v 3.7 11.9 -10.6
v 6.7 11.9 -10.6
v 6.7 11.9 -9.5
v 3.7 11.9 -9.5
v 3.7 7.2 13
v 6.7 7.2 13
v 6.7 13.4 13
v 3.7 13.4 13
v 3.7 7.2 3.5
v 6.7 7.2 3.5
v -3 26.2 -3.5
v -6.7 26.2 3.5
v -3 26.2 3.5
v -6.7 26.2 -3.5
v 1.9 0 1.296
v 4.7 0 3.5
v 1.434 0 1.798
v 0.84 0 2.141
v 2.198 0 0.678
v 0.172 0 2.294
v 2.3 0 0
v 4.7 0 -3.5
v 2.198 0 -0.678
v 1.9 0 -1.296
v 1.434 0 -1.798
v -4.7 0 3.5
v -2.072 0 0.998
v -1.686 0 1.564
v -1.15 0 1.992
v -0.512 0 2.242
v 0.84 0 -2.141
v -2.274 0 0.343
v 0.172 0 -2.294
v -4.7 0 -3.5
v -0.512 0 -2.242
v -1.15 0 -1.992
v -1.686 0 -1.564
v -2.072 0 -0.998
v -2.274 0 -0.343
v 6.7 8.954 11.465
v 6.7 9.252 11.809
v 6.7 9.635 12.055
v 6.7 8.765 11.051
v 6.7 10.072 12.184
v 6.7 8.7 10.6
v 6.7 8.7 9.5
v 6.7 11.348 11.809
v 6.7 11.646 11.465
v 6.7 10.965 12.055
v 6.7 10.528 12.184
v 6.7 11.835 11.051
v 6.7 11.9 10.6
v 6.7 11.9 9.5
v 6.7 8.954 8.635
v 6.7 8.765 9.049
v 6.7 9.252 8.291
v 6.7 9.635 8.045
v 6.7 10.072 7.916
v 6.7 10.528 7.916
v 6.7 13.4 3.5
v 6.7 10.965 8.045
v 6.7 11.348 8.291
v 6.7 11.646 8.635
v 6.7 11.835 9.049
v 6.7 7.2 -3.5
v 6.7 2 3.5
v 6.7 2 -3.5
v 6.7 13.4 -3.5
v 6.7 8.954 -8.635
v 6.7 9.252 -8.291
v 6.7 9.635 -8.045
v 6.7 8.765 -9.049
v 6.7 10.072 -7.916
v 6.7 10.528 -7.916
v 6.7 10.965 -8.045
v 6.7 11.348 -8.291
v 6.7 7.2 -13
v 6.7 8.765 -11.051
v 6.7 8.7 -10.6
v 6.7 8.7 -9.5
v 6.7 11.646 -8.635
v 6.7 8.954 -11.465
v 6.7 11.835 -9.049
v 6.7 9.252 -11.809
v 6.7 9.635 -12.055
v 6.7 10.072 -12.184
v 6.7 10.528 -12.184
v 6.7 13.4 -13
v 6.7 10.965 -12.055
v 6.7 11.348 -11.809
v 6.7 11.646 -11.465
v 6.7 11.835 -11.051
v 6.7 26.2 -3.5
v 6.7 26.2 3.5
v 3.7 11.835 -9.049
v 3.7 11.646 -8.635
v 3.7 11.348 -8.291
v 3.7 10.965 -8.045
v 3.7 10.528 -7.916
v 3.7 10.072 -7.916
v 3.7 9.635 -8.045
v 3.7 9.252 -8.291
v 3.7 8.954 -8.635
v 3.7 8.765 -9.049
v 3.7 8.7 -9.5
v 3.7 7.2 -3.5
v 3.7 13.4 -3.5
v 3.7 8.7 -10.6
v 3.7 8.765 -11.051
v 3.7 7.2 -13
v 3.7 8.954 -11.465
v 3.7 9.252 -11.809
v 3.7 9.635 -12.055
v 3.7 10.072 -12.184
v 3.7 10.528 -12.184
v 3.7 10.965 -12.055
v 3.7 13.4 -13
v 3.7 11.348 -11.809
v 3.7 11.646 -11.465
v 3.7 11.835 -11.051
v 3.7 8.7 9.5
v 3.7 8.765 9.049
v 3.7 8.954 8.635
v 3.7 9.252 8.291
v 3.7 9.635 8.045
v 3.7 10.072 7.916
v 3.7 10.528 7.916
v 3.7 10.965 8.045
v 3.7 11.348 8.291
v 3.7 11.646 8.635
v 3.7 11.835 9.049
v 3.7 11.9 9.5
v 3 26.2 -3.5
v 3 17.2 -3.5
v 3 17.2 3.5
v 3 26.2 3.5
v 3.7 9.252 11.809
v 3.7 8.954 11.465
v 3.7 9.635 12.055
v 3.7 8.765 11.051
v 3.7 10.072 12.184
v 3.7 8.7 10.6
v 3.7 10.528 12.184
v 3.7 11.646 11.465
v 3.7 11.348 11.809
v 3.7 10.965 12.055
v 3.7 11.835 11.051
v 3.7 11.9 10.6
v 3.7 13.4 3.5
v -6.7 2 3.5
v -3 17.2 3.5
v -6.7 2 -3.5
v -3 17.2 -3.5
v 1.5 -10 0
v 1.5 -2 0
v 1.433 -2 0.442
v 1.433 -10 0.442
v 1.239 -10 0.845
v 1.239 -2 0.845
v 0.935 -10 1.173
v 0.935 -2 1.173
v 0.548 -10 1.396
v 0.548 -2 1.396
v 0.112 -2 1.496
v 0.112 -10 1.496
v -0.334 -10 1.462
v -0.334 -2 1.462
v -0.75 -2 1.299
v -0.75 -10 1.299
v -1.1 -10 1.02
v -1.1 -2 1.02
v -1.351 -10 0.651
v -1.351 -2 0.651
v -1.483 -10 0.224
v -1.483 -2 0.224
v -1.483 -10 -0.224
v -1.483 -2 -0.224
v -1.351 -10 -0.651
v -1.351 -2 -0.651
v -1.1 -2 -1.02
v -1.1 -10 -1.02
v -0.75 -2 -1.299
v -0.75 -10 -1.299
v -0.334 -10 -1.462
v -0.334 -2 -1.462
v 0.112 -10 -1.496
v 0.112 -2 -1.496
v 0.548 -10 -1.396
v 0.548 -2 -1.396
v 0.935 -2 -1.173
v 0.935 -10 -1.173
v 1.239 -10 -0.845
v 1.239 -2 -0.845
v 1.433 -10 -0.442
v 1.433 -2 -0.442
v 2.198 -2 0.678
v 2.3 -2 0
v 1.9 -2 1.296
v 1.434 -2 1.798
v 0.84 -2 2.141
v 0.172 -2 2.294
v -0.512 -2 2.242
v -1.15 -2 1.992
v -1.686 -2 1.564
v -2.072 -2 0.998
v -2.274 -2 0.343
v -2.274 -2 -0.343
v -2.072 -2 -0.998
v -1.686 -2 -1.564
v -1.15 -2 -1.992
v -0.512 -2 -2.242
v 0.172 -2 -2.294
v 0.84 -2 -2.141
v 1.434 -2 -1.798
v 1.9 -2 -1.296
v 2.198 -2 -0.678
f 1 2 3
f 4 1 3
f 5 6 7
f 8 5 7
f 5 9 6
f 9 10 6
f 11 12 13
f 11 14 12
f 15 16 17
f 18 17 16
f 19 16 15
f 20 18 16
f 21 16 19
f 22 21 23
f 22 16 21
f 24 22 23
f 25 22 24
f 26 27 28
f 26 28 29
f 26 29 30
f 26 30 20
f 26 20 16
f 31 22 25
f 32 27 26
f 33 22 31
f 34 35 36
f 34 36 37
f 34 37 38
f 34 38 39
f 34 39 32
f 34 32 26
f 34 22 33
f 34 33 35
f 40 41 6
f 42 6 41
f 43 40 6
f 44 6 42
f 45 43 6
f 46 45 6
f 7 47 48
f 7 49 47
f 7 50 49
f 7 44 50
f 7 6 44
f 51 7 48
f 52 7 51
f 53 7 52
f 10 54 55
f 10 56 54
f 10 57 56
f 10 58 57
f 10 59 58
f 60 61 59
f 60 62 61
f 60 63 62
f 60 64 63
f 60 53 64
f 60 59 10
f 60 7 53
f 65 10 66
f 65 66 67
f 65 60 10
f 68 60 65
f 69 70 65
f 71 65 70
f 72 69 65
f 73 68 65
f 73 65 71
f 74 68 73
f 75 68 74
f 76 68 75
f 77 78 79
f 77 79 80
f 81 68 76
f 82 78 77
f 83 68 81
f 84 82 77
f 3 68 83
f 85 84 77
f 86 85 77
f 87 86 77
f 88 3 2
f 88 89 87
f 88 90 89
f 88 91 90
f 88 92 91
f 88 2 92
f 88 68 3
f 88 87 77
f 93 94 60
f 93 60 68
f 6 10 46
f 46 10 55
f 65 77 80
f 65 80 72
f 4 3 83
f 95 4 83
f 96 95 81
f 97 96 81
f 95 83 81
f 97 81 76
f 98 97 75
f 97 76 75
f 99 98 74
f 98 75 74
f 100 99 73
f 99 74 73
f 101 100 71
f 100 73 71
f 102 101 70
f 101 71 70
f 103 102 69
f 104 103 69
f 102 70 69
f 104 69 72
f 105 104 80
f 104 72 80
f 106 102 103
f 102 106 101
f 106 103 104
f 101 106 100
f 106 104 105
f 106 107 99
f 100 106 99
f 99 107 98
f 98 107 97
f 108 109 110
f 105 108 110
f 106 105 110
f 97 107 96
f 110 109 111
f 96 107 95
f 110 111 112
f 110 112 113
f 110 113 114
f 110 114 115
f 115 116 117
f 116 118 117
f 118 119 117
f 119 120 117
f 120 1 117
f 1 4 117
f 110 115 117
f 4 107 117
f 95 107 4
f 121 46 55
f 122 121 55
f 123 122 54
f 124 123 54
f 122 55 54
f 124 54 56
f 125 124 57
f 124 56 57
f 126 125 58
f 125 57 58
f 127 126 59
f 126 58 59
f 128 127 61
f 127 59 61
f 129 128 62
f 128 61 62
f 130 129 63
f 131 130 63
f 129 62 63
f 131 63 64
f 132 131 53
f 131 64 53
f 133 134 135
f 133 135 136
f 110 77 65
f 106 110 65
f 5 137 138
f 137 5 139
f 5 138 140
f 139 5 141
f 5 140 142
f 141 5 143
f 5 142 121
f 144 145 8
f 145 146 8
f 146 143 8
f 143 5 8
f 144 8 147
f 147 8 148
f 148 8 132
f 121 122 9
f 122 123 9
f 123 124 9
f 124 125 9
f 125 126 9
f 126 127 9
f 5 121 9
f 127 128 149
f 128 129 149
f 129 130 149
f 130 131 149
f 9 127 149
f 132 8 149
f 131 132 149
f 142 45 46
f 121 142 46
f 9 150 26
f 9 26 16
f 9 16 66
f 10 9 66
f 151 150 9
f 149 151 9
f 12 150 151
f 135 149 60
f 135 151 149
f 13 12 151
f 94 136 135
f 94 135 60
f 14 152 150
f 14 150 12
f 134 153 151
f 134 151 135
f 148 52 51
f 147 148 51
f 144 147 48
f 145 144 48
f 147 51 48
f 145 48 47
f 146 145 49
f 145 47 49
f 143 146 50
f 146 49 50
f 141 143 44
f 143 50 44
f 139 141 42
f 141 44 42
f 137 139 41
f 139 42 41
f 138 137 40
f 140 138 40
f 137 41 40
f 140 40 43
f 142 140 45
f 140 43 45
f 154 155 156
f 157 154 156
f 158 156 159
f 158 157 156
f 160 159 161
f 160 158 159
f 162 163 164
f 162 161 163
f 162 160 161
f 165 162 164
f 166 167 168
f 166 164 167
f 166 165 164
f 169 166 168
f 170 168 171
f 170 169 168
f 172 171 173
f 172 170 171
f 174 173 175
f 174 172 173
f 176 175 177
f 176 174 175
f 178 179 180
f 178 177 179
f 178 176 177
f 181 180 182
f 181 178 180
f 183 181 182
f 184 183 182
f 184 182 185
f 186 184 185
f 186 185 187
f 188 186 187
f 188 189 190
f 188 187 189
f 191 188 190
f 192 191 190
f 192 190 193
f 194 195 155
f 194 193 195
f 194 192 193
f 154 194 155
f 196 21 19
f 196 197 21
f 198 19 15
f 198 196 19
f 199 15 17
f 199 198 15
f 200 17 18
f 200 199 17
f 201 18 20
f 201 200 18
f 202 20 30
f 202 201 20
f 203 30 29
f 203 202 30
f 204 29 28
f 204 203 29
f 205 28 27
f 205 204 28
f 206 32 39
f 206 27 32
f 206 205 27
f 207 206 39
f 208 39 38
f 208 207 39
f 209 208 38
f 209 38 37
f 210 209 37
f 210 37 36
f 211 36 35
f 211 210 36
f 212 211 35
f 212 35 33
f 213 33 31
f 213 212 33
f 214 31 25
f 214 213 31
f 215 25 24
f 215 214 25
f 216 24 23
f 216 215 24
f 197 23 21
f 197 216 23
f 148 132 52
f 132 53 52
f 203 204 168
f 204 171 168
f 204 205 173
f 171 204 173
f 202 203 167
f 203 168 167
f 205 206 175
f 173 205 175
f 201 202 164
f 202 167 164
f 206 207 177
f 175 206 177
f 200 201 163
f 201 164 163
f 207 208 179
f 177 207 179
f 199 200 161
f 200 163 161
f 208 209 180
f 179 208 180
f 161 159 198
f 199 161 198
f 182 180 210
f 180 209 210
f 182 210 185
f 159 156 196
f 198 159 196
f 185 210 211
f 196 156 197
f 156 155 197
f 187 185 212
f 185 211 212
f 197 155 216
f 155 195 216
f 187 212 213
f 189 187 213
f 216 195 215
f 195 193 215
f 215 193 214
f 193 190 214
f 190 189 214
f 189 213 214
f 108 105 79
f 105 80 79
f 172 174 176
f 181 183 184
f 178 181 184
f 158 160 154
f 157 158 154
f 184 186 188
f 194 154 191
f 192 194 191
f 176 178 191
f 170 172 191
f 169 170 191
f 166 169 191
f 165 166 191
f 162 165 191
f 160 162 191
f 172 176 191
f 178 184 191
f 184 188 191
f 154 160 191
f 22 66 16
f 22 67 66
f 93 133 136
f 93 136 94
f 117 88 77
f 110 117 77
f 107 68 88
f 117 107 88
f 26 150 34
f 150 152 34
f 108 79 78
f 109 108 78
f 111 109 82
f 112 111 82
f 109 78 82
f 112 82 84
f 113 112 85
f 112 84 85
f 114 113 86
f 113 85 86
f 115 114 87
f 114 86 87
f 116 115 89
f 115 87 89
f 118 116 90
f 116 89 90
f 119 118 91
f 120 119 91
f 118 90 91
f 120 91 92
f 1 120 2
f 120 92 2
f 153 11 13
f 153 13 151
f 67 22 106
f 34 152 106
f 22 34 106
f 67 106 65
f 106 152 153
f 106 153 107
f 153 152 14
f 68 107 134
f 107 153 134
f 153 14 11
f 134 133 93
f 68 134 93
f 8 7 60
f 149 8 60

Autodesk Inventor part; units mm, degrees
ref_plane "YZ Plane" through (0, 0, 0) normal (1, 0, 0) x (0, 1, 0)
ref_plane "XZ Plane" through (0, 0, 0) normal (0, 1, 0) x (-1, 0, 0)
ref_plane "XY Plane" through (0, 0, 0) normal (0, 0, 1) x (1, 0, 0)
sketch "草圖1" plane through (0, 0, 0) normal (0, 0, 1) x (1, 0, 0)
  line L0 (-6.7, 26.2) -> (-3, 26.2)
  line L1 (-3, 26.2) -> (-3, 17.2)
  line L2 (-3, 17.2) -> (3, 17.2)
  line L3 (3, 17.2) -> (3, 26.2)
  line L4 (3, 26.2) -> (6.7, 26.2)
  line L5 (6.7, 26.2) -> (6.7, 2)
  line L6 (-6.7, 2) -> (-6.7, 26.2)
  line L7 (-6.7, 2) -> (-4.7, 0)
  line L8 (-4.7, 0) -> (-1.5, 0)
  line L9 (6.7, 2) -> (4.7, 0)
  line L10 (4.7, 0) -> (1.5, 0)
  line L11 (-1.5, 0) -> (1.5, 0)
  point P0 (0, 0)
  point P1 (0, 17.2)
  point P2 (0, 0)
  point P3 (0, 0)
  dimension "d0" = 6
  dimension "d1" = 13.4
  dimension "d5" = 9
  dimension "d10" = 26.2
  dimension "d11" = 135
  dimension "d13" = 2
extrude "擠出1" add sketch "草圖1" along normal mid plane 7
sketch "草圖2" plane through (0, 0, 0) normal (0, 0, 1) x (1, 0, 0)
  line L0 (0, 0) -> (2.3, 0)
  line L1 (1.5, -2) -> (1.5, -10)
  line L2 (1.5, -10) -> (0, -10)
  line L3 (0, -10) -> (0, 0)
  line L4 (-4.7, 0) -> (4.7, 0) construction
  line L5 (2.3, 0) -> (2.3, -2)
  line L6 (2.3, -2) -> (1.5, -2)
  point P0 (1.5, 0)
  dimension "d20" = 4.6
  dimension "d21" = 3
  dimension "d22" = 2
  dimension "d23" = 10
revolve "迴轉1" add sketch "草圖2" angle 360 about axis through (0, -10, 0) along (0, 1, 0)
sketch "草圖3" plane through (6.7, 2, 3.5) normal (1, 0, 0) x (0, 0, -1)
  line L0 (-9.5, 11.4) -> (16.5, 11.4)
  line L1 (16.5, 11.4) -> (16.5, 5.2)
  line L2 (16.5, 5.2) -> (-9.5, 5.2)
  line L3 (-9.5, 5.2) -> (-9.5, 11.4)
  line L4 (-8.7, 8.3) -> (-4.4, 8.3) construction
  line L5 (-7.1, 6.7) -> (-6, 6.7)
  line L6 (-6, 9.9) -> (-7.1, 9.9)
  arc A0 (-7.1, 9.9) -> (-7.1, 6.7) centre (-7.1, 8.3) ccw
  arc A1 (-6, 6.7) -> (-6, 9.9) centre (-6, 8.3) ccw
  line L7 (11.4, 8.3) -> (15.7, 8.3) construction
  line L8 (13, 6.7) -> (14.1, 6.7)
  line L9 (14.1, 9.9) -> (13, 9.9)
  arc A2 (13, 9.9) -> (13, 6.7) centre (13, 8.3) ccw
  arc A3 (14.1, 6.7) -> (14.1, 9.9) centre (14.1, 8.3) ccw
  line L10 (0, -2) -> (7, -2) projected
  line L11 (-4.4, 8.3) -> (11.4, 8.3) construction
  point P0 (3.5, -2)
  point P1 (3.5, 5.2)
  point P2 (16.5, 8.3)
  point P3 (3.5, 8.3)
  dimension "d24" = 26
  dimension "d25" = 6.2
  dimension "d26" = 1.1
  dimension "d27" = 4.3
  dimension "d28" = 19
  dimension "d29" = 10.3
extrude "擠出2" add sketch "草圖3" against normal blind 3
properties part number "RX672-NW" material "SS41"
